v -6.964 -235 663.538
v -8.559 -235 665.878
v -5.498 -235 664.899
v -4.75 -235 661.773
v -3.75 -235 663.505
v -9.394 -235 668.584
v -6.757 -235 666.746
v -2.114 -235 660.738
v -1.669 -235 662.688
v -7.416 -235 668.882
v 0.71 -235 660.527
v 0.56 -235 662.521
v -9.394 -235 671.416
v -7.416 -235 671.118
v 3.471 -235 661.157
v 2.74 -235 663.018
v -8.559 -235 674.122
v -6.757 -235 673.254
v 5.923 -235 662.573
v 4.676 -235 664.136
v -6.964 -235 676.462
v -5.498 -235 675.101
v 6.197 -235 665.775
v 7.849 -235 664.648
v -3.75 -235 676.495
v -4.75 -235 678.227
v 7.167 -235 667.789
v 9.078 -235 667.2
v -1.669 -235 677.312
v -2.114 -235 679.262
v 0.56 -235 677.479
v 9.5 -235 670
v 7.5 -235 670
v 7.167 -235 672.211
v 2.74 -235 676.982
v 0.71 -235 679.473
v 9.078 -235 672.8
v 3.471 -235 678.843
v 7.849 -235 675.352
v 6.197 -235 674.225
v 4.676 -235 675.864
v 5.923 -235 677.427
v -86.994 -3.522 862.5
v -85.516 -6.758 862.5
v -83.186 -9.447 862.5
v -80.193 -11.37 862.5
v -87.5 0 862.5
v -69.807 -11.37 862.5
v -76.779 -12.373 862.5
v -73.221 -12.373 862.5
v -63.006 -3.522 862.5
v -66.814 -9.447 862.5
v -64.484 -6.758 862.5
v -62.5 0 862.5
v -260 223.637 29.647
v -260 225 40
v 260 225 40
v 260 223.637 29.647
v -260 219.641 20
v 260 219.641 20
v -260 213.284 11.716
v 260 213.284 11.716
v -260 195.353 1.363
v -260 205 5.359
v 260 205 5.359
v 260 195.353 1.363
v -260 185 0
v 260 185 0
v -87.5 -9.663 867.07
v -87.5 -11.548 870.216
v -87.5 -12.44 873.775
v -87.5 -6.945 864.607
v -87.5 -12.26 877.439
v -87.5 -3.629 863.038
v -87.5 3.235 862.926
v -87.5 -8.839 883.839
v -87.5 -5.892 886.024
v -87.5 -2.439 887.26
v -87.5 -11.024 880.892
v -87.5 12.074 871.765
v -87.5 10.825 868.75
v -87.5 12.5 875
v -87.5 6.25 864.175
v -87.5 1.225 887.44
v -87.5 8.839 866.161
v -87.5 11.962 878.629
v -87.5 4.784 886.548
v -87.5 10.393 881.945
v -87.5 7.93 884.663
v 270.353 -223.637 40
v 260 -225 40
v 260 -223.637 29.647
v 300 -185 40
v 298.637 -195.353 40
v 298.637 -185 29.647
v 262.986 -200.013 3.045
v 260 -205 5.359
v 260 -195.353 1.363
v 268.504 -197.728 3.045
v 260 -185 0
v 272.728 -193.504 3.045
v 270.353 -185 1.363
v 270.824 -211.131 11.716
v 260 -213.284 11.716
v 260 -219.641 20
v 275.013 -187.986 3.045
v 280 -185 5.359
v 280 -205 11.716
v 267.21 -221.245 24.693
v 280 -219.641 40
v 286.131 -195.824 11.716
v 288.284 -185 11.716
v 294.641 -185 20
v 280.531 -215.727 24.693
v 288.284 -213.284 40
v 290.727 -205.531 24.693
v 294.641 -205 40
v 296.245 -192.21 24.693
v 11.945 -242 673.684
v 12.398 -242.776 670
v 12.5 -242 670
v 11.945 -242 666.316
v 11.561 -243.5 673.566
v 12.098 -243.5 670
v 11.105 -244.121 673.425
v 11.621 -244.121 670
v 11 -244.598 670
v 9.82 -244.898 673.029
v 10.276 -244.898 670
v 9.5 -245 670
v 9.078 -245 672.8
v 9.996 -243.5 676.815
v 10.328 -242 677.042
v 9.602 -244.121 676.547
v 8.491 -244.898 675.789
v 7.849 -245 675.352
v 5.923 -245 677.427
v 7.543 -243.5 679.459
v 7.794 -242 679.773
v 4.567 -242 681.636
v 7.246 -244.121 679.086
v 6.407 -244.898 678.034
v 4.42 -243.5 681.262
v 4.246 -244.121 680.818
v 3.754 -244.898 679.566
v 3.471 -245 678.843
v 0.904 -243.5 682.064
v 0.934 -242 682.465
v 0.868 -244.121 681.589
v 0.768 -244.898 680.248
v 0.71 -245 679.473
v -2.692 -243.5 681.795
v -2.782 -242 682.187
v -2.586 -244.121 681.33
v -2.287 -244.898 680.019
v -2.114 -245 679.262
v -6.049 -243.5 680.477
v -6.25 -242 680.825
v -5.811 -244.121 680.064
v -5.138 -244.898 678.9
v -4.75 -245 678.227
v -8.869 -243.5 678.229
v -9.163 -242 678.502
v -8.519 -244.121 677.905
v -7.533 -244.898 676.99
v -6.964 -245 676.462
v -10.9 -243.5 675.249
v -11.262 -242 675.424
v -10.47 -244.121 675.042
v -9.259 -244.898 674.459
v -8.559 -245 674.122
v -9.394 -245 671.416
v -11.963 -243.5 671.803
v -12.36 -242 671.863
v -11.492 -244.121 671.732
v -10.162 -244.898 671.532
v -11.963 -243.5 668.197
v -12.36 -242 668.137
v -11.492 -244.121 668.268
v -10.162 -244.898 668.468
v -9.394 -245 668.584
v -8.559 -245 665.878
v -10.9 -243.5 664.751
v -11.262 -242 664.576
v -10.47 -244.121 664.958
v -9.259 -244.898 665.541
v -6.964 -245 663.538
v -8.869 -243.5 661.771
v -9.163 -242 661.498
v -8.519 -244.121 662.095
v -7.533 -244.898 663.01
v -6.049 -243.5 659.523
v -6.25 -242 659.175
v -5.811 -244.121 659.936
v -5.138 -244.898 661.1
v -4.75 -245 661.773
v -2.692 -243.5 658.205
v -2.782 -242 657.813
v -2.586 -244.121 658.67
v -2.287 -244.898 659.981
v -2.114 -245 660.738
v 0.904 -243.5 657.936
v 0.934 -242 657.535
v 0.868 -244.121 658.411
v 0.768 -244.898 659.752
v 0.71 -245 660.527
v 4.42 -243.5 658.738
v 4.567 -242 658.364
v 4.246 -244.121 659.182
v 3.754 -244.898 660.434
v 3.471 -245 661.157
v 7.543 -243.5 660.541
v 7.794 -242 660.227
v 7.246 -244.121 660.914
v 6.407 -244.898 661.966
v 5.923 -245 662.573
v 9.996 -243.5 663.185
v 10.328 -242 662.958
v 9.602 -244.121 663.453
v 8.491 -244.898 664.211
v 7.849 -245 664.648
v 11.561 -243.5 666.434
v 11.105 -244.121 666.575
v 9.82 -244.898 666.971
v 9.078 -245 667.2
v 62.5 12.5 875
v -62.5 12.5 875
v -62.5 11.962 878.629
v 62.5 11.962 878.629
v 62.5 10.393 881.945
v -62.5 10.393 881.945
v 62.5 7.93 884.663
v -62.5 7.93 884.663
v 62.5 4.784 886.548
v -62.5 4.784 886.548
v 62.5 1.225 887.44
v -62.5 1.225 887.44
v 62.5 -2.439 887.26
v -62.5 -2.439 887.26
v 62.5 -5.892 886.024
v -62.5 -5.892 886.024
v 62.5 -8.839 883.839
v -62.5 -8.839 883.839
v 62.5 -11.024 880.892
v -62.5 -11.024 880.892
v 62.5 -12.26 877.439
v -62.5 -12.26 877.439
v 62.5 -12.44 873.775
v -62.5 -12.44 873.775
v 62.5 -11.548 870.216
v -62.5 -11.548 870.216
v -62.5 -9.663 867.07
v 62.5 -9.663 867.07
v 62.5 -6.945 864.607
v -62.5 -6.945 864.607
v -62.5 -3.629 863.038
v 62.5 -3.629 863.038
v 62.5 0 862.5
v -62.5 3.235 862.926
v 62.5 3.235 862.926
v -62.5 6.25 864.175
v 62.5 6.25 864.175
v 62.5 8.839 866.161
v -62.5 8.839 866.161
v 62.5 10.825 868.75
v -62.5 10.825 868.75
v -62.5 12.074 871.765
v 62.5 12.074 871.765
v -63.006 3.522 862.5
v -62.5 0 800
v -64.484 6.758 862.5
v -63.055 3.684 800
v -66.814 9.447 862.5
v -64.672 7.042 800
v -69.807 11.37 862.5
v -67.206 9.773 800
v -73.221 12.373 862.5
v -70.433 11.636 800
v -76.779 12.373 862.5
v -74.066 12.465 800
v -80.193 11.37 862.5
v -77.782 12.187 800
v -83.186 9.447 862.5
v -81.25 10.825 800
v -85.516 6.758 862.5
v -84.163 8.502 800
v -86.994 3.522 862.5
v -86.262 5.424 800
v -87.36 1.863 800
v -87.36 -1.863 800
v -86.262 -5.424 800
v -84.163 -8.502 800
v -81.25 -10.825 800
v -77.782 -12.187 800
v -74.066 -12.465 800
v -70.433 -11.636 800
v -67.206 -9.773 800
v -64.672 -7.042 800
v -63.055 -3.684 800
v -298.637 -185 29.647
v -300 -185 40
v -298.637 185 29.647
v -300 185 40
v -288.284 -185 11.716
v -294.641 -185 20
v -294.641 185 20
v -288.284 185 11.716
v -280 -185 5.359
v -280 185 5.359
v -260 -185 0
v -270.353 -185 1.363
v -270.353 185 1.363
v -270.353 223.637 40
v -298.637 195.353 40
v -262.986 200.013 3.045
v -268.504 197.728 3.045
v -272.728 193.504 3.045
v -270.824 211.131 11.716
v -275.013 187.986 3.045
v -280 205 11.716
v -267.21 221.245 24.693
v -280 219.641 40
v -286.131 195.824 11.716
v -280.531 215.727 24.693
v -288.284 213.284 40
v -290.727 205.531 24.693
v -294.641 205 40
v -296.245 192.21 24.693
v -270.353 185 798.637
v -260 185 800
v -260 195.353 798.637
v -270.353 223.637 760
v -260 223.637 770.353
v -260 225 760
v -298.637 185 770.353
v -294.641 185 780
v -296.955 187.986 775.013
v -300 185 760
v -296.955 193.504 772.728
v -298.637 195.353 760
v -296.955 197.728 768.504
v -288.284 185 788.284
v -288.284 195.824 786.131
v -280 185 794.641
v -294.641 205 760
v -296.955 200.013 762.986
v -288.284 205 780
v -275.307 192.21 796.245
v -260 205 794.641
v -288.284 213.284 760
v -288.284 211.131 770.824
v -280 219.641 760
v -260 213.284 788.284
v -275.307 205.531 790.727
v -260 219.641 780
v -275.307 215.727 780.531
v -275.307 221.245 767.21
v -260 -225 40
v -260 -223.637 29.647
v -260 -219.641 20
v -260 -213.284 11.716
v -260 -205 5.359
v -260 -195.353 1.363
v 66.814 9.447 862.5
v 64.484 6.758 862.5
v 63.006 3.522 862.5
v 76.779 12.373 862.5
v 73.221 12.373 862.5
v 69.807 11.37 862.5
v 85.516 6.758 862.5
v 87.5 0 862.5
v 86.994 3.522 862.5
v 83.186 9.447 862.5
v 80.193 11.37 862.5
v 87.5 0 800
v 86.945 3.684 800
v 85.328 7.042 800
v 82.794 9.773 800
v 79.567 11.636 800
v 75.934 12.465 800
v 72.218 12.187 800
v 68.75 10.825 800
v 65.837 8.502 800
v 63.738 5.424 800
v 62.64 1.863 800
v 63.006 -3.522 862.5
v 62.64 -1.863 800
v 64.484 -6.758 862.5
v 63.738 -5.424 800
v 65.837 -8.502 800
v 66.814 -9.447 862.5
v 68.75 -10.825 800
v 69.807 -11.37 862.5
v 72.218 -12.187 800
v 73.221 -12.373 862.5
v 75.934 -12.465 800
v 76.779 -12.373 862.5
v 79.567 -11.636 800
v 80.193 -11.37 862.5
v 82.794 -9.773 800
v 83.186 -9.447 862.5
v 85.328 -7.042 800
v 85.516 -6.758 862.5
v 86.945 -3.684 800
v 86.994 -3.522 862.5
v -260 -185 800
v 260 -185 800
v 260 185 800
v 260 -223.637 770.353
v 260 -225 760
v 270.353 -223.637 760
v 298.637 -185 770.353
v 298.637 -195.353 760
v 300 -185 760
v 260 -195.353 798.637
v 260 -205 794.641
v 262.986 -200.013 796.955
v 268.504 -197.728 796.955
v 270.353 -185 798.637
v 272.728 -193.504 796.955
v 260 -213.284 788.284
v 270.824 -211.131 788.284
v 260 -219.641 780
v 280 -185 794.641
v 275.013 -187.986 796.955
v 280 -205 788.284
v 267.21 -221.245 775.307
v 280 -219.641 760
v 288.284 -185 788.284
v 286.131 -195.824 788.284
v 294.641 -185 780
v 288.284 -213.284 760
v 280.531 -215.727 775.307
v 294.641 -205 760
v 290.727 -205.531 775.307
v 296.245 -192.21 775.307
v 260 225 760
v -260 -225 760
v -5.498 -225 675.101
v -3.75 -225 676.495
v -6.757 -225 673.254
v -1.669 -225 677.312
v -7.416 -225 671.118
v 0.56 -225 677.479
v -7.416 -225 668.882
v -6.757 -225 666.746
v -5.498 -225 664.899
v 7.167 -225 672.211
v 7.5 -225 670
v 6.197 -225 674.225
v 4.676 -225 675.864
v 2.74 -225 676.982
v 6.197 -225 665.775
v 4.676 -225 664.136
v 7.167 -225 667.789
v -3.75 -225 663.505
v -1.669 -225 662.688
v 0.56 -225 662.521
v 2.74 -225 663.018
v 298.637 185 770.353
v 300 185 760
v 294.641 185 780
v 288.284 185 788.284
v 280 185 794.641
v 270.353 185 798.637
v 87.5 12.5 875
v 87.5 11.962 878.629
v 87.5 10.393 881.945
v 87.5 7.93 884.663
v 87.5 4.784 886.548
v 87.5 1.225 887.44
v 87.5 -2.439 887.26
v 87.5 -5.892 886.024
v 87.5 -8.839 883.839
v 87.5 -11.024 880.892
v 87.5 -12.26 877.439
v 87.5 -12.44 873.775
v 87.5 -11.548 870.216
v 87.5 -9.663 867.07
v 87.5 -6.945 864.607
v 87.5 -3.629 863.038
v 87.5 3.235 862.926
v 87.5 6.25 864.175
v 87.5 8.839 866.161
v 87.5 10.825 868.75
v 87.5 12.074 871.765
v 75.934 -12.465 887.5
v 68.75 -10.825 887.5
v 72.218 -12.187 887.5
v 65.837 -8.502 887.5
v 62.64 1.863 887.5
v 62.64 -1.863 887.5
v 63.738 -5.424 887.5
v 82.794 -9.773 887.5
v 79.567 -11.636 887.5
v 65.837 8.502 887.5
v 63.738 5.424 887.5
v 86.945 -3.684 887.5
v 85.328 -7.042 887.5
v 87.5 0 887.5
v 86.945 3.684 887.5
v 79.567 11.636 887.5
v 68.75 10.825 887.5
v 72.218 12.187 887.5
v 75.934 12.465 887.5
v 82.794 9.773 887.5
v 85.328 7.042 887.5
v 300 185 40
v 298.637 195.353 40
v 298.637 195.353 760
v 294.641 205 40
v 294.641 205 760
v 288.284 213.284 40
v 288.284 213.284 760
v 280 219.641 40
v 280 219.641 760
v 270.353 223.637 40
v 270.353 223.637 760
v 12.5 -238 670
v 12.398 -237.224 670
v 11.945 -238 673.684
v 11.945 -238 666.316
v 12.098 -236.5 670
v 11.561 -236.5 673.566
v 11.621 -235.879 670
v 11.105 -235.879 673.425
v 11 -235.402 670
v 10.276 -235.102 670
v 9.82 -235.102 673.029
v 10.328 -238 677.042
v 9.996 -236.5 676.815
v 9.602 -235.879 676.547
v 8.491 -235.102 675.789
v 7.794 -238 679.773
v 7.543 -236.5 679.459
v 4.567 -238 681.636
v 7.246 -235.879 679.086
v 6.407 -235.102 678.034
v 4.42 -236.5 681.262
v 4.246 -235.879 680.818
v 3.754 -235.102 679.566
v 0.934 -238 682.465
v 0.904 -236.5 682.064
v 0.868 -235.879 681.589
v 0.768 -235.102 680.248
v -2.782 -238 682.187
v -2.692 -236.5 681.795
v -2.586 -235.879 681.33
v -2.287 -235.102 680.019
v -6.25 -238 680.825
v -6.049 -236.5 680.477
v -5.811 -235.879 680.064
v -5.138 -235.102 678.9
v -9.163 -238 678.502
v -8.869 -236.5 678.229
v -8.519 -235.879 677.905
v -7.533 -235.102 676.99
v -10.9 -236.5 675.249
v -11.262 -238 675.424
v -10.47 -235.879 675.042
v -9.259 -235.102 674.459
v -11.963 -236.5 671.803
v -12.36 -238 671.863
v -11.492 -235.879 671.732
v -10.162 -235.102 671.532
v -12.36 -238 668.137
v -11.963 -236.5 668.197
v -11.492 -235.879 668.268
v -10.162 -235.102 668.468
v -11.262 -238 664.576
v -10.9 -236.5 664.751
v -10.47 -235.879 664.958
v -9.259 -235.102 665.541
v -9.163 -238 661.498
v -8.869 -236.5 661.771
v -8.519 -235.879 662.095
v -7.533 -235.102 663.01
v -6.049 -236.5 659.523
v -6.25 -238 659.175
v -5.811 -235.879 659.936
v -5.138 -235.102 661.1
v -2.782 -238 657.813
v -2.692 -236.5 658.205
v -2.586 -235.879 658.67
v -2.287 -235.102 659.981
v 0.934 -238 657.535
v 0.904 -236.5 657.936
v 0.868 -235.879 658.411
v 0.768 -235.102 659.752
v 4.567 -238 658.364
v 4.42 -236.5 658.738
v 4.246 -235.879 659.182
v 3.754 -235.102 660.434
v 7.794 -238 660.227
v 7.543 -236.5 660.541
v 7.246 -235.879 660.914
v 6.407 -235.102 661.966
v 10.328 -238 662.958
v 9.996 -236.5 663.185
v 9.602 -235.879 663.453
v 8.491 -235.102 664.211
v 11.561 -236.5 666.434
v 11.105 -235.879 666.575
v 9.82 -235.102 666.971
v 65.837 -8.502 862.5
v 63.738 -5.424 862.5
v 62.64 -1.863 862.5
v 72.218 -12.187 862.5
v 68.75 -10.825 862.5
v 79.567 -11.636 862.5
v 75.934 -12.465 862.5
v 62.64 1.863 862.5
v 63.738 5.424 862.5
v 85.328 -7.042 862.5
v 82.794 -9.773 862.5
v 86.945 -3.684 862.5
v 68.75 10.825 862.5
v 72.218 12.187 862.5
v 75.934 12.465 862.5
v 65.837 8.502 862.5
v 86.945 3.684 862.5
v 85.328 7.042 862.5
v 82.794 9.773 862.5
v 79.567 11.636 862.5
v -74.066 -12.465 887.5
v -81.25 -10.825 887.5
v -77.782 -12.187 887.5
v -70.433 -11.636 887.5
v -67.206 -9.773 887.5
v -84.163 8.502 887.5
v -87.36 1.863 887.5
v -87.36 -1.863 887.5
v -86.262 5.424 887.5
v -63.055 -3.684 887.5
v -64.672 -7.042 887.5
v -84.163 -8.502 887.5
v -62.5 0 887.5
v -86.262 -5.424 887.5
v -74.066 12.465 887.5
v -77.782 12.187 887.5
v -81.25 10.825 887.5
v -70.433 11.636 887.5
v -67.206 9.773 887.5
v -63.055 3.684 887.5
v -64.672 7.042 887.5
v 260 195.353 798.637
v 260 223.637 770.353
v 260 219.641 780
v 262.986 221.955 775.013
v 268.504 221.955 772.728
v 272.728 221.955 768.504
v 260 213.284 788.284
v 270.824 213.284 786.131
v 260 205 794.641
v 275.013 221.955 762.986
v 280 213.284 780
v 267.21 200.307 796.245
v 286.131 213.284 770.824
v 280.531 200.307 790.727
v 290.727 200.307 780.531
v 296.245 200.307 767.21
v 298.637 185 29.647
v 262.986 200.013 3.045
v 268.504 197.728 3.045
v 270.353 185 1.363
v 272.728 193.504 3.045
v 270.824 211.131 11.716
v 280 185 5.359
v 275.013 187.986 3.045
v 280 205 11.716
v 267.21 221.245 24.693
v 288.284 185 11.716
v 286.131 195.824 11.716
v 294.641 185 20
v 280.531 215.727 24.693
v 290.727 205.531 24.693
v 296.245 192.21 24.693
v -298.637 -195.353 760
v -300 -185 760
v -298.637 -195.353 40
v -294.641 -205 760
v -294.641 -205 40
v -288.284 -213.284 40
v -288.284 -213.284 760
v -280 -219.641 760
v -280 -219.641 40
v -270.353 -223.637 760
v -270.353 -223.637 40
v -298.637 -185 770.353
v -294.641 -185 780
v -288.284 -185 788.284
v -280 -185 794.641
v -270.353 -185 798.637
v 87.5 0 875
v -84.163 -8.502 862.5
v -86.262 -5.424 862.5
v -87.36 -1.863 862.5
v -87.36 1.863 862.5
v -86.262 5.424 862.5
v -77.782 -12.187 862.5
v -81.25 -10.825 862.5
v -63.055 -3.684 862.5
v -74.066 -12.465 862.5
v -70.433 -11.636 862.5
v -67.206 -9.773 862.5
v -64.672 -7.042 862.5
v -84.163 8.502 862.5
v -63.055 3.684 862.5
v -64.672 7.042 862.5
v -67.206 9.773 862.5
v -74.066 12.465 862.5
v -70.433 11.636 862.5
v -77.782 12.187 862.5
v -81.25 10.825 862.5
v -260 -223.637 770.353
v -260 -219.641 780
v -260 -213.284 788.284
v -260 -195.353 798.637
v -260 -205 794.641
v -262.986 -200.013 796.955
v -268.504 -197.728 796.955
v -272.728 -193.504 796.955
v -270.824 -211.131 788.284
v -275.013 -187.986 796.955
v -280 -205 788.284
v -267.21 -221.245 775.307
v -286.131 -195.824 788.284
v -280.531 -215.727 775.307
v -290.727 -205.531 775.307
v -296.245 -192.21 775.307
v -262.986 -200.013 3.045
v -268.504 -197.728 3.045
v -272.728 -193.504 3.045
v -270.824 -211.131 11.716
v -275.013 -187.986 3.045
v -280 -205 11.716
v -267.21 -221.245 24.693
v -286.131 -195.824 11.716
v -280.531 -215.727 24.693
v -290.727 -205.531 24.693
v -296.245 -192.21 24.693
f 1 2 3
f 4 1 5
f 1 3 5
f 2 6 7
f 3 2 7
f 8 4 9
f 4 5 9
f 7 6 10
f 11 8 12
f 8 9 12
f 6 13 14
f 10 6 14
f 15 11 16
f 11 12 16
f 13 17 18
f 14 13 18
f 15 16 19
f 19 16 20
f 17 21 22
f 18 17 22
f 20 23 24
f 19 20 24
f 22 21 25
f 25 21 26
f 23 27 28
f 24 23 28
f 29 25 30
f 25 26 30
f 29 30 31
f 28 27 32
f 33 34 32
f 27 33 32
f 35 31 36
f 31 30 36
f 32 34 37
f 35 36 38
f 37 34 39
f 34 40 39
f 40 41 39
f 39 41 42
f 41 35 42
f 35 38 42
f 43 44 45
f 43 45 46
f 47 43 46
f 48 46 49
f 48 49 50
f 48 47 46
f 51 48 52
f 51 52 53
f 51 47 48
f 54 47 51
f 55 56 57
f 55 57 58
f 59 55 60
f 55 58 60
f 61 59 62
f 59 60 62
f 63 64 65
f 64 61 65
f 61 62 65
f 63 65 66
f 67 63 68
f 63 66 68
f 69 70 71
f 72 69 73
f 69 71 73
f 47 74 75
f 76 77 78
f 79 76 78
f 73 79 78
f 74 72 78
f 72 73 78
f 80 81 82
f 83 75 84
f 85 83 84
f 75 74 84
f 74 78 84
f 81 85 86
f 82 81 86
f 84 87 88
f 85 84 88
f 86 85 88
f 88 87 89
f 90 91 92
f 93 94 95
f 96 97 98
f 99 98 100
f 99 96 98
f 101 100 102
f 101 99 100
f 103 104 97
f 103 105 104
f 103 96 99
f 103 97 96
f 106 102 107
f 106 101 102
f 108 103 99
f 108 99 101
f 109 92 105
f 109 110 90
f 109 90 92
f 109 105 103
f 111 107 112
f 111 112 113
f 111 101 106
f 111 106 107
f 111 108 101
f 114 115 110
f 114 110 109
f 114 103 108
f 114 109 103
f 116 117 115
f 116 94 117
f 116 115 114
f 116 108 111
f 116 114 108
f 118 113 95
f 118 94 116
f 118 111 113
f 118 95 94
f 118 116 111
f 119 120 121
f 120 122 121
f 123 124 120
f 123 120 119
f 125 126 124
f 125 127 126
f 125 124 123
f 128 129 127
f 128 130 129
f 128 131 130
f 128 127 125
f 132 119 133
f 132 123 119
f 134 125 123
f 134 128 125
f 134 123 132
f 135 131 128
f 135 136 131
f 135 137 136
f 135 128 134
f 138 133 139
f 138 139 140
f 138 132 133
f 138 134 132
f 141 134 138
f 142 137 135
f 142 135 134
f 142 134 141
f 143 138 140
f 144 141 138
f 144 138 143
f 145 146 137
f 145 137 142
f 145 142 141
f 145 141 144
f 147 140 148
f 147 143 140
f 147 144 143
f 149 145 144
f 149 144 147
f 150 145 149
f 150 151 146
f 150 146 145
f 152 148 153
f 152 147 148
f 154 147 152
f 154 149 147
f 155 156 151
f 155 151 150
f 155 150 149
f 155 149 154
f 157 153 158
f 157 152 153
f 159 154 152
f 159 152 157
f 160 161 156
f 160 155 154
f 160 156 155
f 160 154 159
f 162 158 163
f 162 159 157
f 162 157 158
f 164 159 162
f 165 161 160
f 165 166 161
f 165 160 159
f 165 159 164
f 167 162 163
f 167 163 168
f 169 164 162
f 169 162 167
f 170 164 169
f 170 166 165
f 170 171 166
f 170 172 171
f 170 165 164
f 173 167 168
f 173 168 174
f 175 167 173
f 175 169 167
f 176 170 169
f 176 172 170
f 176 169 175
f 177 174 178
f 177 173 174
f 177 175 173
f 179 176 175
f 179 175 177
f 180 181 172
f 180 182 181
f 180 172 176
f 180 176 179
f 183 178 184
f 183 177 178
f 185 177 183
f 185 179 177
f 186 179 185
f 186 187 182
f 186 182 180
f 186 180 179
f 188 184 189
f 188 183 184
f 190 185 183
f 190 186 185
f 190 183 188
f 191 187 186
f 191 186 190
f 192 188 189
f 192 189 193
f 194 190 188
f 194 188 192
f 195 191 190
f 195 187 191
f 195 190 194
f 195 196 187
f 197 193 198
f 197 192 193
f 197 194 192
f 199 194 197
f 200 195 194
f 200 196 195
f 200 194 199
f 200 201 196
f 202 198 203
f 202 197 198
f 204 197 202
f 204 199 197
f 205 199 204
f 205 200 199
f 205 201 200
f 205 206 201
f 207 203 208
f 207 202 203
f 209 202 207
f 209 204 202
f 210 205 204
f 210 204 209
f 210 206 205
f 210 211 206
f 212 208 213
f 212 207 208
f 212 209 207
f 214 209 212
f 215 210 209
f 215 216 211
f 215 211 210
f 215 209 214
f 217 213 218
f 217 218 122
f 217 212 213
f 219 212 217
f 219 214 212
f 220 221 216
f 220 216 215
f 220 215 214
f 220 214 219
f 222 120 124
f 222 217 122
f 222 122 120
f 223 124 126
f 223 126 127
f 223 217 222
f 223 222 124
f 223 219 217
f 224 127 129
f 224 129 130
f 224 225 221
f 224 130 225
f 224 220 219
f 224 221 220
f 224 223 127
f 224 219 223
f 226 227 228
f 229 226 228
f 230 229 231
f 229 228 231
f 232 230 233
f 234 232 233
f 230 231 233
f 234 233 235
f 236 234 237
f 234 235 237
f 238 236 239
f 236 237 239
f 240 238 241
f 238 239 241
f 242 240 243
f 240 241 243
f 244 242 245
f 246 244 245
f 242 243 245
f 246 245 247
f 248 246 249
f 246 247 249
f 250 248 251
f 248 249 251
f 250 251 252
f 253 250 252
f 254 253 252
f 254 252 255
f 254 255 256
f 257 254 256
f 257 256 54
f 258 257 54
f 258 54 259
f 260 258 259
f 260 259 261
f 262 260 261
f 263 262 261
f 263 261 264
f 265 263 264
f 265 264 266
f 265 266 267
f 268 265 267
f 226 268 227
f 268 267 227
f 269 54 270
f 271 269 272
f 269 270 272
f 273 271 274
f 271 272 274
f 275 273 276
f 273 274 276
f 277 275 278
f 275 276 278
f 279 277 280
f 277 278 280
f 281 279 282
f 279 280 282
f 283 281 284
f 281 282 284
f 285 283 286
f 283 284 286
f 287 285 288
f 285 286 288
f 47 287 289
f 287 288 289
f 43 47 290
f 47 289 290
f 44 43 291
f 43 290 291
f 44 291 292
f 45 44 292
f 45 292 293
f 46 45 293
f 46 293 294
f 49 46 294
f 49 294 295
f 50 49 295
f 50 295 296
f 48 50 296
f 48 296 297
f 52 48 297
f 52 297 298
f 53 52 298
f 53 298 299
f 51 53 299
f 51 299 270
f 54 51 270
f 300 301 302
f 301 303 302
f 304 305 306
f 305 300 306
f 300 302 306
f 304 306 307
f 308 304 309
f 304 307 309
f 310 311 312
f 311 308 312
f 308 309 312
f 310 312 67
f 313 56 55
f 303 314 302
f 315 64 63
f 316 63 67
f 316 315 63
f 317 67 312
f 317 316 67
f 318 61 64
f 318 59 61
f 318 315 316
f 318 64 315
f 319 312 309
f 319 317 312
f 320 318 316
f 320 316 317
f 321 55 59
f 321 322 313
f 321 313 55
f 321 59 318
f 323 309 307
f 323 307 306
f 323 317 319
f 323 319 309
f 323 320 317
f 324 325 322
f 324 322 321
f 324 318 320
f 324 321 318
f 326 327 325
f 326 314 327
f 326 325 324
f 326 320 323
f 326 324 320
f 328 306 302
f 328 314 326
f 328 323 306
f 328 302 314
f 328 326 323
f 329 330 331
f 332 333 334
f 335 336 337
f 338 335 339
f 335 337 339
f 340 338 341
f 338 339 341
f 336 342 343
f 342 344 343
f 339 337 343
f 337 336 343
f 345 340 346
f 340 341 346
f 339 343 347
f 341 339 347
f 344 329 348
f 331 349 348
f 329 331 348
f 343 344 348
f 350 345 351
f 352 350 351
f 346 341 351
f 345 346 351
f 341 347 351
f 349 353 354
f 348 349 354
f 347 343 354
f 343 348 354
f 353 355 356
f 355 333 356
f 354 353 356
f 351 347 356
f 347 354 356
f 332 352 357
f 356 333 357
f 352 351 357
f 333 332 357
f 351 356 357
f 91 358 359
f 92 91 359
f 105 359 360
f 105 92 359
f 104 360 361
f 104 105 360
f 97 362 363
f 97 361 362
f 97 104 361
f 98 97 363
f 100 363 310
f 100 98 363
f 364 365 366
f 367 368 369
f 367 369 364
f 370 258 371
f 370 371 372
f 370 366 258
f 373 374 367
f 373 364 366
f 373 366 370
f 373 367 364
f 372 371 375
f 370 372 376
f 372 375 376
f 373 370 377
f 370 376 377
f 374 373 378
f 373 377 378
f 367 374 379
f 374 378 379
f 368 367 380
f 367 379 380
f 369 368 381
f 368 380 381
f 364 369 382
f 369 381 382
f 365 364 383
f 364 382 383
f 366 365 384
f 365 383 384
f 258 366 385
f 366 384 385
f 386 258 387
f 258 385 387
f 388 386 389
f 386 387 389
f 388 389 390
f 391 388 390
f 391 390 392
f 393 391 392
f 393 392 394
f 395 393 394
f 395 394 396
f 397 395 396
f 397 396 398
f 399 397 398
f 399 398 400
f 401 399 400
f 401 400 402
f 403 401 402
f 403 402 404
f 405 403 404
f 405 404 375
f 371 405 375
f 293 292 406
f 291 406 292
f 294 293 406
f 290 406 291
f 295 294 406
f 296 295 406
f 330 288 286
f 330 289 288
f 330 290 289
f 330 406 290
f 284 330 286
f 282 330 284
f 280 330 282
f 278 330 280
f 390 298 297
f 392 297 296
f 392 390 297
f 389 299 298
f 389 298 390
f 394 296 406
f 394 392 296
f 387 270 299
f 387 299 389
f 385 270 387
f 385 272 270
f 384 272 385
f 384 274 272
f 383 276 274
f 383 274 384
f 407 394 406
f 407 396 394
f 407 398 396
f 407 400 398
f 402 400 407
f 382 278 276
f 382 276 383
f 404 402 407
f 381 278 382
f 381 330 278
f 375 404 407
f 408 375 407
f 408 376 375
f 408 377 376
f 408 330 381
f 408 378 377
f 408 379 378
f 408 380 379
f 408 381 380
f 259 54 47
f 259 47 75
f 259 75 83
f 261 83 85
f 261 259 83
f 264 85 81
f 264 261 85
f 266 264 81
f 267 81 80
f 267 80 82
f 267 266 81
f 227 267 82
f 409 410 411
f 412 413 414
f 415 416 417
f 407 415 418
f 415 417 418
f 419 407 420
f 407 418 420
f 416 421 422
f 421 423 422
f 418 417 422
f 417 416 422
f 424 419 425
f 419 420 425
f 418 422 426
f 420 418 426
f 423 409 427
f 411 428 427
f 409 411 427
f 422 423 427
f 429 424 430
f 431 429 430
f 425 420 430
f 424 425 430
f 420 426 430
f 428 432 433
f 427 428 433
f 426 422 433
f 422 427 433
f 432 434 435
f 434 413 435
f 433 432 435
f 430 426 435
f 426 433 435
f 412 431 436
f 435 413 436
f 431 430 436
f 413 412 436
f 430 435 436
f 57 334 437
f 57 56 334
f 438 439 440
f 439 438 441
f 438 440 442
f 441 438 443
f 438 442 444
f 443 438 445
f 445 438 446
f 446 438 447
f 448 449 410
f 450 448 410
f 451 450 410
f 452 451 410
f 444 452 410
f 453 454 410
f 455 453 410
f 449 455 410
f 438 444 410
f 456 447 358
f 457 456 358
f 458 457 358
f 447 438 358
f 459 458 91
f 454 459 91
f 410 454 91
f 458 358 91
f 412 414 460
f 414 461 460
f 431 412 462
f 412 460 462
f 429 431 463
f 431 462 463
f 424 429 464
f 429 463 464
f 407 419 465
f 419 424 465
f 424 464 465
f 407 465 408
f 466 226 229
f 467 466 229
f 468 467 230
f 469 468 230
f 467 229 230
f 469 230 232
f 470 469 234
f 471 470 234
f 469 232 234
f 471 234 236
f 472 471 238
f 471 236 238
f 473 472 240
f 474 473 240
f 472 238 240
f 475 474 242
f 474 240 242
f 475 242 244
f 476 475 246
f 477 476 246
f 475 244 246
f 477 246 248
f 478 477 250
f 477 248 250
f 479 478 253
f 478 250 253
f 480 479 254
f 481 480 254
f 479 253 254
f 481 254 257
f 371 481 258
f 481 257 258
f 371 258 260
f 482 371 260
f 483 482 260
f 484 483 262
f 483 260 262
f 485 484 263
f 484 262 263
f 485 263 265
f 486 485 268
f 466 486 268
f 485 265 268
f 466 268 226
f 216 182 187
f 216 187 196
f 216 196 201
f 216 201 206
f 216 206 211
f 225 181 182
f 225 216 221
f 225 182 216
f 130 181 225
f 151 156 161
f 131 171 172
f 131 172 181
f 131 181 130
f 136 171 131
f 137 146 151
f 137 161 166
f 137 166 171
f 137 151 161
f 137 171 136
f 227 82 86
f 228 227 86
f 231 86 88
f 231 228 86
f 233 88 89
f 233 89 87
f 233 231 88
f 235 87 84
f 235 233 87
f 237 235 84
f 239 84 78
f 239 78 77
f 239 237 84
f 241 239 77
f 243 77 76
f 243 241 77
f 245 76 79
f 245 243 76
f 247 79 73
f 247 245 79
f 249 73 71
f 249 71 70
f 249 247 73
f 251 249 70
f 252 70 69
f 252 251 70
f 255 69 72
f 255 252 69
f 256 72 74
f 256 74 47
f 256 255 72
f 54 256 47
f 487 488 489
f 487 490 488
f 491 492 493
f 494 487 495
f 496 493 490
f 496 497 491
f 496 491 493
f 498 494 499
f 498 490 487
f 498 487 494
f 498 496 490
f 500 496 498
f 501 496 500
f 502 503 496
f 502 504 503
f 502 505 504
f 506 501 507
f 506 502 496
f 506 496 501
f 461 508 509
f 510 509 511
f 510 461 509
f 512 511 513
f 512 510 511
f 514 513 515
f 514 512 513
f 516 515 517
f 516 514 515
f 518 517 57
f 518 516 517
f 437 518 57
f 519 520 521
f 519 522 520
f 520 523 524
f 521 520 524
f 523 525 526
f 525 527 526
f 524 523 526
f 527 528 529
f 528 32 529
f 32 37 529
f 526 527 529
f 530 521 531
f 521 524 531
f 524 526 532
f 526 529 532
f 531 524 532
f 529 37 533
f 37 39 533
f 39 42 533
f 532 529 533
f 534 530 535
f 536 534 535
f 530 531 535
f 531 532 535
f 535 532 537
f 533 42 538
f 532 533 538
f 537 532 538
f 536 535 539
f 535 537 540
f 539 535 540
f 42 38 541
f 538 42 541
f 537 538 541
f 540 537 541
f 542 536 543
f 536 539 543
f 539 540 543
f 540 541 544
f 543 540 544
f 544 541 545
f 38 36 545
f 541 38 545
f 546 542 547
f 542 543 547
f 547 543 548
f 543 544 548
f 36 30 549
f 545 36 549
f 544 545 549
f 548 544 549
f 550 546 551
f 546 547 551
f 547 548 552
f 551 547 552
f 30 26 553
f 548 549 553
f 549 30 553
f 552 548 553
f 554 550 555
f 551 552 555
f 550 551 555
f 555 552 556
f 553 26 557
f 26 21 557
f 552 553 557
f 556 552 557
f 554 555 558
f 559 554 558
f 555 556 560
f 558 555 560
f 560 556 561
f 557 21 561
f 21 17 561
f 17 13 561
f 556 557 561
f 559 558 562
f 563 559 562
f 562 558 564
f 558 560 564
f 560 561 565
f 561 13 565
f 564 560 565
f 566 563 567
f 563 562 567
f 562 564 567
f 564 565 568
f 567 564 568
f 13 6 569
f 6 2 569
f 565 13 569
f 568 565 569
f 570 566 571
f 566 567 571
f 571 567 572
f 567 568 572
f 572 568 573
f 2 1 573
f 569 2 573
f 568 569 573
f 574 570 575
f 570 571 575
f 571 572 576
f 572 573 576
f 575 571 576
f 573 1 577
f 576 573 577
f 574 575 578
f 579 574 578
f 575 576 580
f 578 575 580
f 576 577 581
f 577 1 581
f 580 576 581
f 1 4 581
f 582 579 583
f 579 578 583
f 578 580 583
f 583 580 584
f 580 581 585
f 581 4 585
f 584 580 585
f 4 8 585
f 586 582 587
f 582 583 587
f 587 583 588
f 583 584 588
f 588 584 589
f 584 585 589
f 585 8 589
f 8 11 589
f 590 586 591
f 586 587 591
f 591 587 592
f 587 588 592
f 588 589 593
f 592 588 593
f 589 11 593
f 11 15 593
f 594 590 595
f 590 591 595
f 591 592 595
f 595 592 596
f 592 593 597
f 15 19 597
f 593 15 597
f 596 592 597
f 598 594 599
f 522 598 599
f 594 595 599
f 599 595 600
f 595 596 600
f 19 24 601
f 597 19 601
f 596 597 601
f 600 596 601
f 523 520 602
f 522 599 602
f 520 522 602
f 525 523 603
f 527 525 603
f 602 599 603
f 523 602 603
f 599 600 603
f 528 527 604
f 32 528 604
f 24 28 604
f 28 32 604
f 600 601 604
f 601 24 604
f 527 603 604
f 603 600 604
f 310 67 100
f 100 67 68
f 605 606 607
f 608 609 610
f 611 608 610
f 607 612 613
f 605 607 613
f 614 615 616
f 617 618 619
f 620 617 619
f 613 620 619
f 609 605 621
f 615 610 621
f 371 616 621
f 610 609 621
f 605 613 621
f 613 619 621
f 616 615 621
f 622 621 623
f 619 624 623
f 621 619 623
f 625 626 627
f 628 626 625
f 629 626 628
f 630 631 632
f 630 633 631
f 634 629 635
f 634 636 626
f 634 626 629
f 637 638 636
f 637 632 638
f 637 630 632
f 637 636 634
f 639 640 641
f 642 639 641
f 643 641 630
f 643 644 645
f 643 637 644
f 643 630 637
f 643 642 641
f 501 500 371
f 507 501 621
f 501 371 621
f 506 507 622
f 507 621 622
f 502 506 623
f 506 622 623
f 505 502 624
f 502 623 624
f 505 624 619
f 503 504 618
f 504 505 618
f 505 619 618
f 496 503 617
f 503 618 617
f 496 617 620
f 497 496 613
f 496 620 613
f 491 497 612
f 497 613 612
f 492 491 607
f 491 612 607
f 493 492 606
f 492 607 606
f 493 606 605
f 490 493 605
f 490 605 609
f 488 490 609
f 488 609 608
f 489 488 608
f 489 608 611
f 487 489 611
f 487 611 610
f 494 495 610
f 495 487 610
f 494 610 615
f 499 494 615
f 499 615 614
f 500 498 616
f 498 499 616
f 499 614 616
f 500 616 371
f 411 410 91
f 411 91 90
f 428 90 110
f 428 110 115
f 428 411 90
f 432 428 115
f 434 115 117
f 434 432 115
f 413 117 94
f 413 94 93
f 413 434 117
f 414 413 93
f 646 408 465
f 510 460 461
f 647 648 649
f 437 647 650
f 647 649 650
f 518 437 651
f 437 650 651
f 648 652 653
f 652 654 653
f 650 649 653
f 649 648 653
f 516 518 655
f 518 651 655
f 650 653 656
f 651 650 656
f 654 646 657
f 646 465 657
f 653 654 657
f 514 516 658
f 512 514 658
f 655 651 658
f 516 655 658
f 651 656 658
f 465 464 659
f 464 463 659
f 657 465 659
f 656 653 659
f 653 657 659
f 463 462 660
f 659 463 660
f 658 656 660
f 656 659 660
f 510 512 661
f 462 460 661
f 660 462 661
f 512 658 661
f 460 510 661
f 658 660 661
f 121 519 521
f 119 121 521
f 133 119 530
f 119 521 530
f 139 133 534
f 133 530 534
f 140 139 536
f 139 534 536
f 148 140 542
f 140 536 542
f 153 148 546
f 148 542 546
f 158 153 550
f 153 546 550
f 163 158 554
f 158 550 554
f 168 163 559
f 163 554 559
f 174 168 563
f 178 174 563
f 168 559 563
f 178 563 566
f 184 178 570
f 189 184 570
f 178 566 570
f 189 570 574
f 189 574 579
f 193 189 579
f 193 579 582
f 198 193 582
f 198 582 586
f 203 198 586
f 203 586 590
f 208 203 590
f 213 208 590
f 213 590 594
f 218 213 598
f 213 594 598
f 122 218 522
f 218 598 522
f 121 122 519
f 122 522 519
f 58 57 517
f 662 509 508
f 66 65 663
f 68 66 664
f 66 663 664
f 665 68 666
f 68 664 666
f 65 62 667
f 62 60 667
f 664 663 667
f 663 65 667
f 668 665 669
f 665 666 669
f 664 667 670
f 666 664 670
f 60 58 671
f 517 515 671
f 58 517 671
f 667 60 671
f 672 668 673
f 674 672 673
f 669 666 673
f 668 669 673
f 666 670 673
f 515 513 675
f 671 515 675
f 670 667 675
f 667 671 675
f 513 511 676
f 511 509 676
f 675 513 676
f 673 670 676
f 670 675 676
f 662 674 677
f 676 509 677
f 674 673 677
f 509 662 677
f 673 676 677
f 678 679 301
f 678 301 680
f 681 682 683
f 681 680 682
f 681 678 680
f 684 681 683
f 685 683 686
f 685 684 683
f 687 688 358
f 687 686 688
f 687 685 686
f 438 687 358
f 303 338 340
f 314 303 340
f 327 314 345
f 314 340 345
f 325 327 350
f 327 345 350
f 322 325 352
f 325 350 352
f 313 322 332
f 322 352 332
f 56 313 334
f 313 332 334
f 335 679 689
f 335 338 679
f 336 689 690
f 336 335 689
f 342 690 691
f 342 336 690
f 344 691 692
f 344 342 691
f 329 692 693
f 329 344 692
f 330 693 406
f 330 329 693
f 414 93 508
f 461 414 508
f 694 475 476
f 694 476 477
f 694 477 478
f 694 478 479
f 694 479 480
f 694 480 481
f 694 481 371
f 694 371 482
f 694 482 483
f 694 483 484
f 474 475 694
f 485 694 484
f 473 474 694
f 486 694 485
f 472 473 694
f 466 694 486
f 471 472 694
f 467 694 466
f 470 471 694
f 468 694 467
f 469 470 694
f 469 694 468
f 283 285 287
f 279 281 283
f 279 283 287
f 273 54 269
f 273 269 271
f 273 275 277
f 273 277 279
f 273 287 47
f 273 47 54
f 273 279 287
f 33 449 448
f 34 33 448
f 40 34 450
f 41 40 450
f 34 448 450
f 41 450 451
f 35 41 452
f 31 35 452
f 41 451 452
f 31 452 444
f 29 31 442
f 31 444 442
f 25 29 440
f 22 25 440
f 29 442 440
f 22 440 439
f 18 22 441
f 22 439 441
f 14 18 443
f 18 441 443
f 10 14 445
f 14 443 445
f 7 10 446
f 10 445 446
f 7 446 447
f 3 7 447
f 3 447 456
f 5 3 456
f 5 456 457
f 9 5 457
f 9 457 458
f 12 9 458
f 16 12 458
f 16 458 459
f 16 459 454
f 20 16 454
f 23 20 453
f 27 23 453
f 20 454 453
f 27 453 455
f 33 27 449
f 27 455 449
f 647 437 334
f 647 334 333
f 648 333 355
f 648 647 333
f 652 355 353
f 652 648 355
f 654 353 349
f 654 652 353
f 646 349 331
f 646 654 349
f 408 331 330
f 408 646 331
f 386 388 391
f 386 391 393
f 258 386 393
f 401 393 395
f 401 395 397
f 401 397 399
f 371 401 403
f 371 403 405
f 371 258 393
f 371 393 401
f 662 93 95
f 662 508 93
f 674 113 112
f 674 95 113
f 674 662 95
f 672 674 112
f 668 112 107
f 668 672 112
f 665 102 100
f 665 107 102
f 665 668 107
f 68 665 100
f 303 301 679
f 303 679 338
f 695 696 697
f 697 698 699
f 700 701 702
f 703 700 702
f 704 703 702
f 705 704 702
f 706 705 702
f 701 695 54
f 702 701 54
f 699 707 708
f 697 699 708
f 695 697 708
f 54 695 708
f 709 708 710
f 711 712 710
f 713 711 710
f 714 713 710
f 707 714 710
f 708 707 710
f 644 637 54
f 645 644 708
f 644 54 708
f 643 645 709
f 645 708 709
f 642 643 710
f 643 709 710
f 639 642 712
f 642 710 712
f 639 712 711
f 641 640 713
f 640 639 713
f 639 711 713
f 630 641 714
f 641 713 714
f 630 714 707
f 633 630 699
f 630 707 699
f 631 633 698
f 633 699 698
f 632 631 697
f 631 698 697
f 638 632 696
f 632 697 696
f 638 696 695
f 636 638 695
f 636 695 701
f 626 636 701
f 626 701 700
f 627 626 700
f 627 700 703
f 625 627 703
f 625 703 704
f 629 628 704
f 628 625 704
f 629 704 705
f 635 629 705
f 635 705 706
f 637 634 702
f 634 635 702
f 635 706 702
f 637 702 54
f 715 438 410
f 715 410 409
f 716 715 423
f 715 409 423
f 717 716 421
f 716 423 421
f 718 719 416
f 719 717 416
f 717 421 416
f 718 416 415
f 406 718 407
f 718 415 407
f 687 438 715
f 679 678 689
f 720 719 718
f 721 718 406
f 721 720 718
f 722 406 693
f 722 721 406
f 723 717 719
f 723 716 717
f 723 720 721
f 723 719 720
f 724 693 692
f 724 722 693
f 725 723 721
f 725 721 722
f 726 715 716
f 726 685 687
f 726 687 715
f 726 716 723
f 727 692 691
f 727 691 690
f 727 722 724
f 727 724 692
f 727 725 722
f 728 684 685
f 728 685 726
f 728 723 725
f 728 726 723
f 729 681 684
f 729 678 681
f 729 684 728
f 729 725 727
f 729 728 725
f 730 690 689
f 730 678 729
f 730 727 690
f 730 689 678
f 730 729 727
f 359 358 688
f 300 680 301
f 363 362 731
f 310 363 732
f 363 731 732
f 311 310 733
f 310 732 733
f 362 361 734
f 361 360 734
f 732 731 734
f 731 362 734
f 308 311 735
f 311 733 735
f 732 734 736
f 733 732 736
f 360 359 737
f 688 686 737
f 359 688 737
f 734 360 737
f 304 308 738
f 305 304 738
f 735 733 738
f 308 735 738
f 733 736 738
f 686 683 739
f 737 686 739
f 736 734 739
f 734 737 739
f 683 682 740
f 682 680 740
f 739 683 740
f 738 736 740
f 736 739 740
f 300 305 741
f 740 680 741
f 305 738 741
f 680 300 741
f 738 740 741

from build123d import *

# Parameters (mm, degrees)
F0_W      = 600
F0_H      = 450
F1_DEPTH  = 800
F2_R      = 40
F3_R      = 12.5
F4_DEPTH  = 75
F5_R      = 12.5
F7_DEPTH  = 12.5
F8_DEPTH  = 12.5
F9_DEPTH  = 12.5
F6_R      = 12.5
F10_DEPTH = 62.5
F11_DEPTH = 62.5
F12_DEPTH = 12.5
F13_DEPTH = 25
F14_DEPTH = 25
F15_DEPTH = 25
F16_DEPTH = 25
F18_R     = 7.5
F19_DEPTH = 10
F20_R     = 12.5
F20_R_2   = 7.5
F21_DEPTH = 10
F22_R     = 3
F23_R     = 3


with BuildPart() as f1:
    # F0 (on Top) → F1 (new body)
    with BuildSketch(Plane.XY):
        Rectangle(F0_W, F0_H)
    extrude(amount=F1_DEPTH)

    # F2
    f2_edges = [f1.edges().sort_by_distance(p)[0] for p in [
        (-300, -225, 400),
        (300, -225, 400),
        (0, -225, 0),
        (0, -225, 800),
        (300, 0, 800),
        (0, 225, 800),
        (-300, 0, 800),
        (300, 225, 400),
        (-300, 225, 400),
        (0, 225, 0),
        (300, 0, 0),
        (-300, 0, 0),
    ]]
    fillet(f2_edges, radius=F2_R)

    # F3 (on face) → F4 (join)
    with BuildSketch(Plane.XY.offset(800)):
        with Locations((-75, 0)):
            Circle(F3_R)
        with Locations((75, 0)):
            Circle(F3_R)
    extrude(amount=F4_DEPTH)

    # F5 (on face) → F7 (join)
    with BuildSketch(Plane.XY.offset(875)):
        with Locations((-75, 0)):
            Circle(F5_R)
    extrude(amount=-F7_DEPTH)

    # F8 (add): a face of the model
    f8_faces = [f1.faces().sort_by_distance(p)[0] for p in [
        (-75, 0, 875),
    ]]
    extrude(f8_faces, amount=-F8_DEPTH)

    # F9 (cut): a face of the model
    f9_faces = [f1.faces().sort_by_distance(p)[0] for p in [
        (-75, 0, 875),
    ]]
    extrude(f9_faces, amount=-F9_DEPTH, mode=Mode.SUBTRACT)



with BuildPart() as f10:
    # F6 (on Right) → F10 (new body)
    with BuildSketch(Plane.YZ):
        with Locations((0, 875)):
            Circle(F6_R)
    extrude(amount=-F10_DEPTH)


with BuildPart() as f1_1:
    add(f1.part)
    # F11 (add): a face of the model
    f11_faces = [f10.part.faces().sort_by_distance(p)[0] for p in [
        (0, 0, 875),
    ]]

    add(f10.part)  # F11 merges F10
    extrude(f11_faces, amount=F11_DEPTH)

    # F12 (cut): a face of the model
    f12_faces = [f1_1.faces().sort_by_distance(p)[0] for p in [
        (75, 0, 875),
    ]]
    extrude(f12_faces, amount=-F12_DEPTH, mode=Mode.SUBTRACT)

    # F13 (add): a face of the model
    f13_faces = [f1_1.faces().sort_by_distance(p)[0] for p in [
        (62.5, -8.5888347648, 883.5888347648),
    ]]
    extrude(f13_faces, amount=F13_DEPTH)


with BuildPart() as f14:
    # F14 (new): faces of the model
    f14_faces = [f1_1.part.faces().sort_by_distance(p)[0] for p in [
        (75, 5.3051647697, 862.5),
        (75, -5.3051647697, 862.5),
    ]]
    extrude(f14_faces, amount=F14_DEPTH)


with BuildPart() as f1_2:
    add(f1_1.part)

    # F15 (add): a face of the model
    f15_faces = [f1_2.faces().sort_by_distance(p)[0] for p in [
        (-62.5, 0, 875),
    ]]
    extrude(f15_faces, amount=F15_DEPTH)


with BuildPart() as f16:
    # F16 (new): faces of the model
    f16_faces = [f1_2.part.faces().sort_by_distance(p)[0] for p in [
        (-75, 5.3051647697, 862.5),
        (-75, -5.3051647697, 862.5),
    ]]
    extrude(f16_faces, amount=F16_DEPTH)


with BuildPart() as f1_3:
    add(f1_2.part)

    # F18 (on face) → F19 (join)
    with BuildSketch(Plane.XZ.offset(225)):
        with Locations((0, 670)):
            Circle(F18_R)
    extrude(amount=F19_DEPTH)

    # F20 (on face) → F21 (join)
    with BuildSketch(Plane.XZ.offset(235)):
        with Locations((0, 670)):
            Circle(F20_R)
        with Locations((0, 670)):
            Circle(F20_R_2, mode=Mode.SUBTRACT)
        with Locations((0, 670)):
            Circle(F20_R_2)
    extrude(amount=F21_DEPTH)

    # F22
    f22_edges = [f1_3.edges().sort_by_distance(p)[0] for p in [
        (-12.5, -245, 670),
    ]]
    fillet(f22_edges, radius=F22_R)

    # F23
    f23_edges = [f1_3.edges().sort_by_distance(p)[0] for p in [
        (-12.5, -235, 670),
    ]]
    fillet(f23_edges, radius=F23_R)


solid = Compound([f14.part, f16.part, f1_3.part])
